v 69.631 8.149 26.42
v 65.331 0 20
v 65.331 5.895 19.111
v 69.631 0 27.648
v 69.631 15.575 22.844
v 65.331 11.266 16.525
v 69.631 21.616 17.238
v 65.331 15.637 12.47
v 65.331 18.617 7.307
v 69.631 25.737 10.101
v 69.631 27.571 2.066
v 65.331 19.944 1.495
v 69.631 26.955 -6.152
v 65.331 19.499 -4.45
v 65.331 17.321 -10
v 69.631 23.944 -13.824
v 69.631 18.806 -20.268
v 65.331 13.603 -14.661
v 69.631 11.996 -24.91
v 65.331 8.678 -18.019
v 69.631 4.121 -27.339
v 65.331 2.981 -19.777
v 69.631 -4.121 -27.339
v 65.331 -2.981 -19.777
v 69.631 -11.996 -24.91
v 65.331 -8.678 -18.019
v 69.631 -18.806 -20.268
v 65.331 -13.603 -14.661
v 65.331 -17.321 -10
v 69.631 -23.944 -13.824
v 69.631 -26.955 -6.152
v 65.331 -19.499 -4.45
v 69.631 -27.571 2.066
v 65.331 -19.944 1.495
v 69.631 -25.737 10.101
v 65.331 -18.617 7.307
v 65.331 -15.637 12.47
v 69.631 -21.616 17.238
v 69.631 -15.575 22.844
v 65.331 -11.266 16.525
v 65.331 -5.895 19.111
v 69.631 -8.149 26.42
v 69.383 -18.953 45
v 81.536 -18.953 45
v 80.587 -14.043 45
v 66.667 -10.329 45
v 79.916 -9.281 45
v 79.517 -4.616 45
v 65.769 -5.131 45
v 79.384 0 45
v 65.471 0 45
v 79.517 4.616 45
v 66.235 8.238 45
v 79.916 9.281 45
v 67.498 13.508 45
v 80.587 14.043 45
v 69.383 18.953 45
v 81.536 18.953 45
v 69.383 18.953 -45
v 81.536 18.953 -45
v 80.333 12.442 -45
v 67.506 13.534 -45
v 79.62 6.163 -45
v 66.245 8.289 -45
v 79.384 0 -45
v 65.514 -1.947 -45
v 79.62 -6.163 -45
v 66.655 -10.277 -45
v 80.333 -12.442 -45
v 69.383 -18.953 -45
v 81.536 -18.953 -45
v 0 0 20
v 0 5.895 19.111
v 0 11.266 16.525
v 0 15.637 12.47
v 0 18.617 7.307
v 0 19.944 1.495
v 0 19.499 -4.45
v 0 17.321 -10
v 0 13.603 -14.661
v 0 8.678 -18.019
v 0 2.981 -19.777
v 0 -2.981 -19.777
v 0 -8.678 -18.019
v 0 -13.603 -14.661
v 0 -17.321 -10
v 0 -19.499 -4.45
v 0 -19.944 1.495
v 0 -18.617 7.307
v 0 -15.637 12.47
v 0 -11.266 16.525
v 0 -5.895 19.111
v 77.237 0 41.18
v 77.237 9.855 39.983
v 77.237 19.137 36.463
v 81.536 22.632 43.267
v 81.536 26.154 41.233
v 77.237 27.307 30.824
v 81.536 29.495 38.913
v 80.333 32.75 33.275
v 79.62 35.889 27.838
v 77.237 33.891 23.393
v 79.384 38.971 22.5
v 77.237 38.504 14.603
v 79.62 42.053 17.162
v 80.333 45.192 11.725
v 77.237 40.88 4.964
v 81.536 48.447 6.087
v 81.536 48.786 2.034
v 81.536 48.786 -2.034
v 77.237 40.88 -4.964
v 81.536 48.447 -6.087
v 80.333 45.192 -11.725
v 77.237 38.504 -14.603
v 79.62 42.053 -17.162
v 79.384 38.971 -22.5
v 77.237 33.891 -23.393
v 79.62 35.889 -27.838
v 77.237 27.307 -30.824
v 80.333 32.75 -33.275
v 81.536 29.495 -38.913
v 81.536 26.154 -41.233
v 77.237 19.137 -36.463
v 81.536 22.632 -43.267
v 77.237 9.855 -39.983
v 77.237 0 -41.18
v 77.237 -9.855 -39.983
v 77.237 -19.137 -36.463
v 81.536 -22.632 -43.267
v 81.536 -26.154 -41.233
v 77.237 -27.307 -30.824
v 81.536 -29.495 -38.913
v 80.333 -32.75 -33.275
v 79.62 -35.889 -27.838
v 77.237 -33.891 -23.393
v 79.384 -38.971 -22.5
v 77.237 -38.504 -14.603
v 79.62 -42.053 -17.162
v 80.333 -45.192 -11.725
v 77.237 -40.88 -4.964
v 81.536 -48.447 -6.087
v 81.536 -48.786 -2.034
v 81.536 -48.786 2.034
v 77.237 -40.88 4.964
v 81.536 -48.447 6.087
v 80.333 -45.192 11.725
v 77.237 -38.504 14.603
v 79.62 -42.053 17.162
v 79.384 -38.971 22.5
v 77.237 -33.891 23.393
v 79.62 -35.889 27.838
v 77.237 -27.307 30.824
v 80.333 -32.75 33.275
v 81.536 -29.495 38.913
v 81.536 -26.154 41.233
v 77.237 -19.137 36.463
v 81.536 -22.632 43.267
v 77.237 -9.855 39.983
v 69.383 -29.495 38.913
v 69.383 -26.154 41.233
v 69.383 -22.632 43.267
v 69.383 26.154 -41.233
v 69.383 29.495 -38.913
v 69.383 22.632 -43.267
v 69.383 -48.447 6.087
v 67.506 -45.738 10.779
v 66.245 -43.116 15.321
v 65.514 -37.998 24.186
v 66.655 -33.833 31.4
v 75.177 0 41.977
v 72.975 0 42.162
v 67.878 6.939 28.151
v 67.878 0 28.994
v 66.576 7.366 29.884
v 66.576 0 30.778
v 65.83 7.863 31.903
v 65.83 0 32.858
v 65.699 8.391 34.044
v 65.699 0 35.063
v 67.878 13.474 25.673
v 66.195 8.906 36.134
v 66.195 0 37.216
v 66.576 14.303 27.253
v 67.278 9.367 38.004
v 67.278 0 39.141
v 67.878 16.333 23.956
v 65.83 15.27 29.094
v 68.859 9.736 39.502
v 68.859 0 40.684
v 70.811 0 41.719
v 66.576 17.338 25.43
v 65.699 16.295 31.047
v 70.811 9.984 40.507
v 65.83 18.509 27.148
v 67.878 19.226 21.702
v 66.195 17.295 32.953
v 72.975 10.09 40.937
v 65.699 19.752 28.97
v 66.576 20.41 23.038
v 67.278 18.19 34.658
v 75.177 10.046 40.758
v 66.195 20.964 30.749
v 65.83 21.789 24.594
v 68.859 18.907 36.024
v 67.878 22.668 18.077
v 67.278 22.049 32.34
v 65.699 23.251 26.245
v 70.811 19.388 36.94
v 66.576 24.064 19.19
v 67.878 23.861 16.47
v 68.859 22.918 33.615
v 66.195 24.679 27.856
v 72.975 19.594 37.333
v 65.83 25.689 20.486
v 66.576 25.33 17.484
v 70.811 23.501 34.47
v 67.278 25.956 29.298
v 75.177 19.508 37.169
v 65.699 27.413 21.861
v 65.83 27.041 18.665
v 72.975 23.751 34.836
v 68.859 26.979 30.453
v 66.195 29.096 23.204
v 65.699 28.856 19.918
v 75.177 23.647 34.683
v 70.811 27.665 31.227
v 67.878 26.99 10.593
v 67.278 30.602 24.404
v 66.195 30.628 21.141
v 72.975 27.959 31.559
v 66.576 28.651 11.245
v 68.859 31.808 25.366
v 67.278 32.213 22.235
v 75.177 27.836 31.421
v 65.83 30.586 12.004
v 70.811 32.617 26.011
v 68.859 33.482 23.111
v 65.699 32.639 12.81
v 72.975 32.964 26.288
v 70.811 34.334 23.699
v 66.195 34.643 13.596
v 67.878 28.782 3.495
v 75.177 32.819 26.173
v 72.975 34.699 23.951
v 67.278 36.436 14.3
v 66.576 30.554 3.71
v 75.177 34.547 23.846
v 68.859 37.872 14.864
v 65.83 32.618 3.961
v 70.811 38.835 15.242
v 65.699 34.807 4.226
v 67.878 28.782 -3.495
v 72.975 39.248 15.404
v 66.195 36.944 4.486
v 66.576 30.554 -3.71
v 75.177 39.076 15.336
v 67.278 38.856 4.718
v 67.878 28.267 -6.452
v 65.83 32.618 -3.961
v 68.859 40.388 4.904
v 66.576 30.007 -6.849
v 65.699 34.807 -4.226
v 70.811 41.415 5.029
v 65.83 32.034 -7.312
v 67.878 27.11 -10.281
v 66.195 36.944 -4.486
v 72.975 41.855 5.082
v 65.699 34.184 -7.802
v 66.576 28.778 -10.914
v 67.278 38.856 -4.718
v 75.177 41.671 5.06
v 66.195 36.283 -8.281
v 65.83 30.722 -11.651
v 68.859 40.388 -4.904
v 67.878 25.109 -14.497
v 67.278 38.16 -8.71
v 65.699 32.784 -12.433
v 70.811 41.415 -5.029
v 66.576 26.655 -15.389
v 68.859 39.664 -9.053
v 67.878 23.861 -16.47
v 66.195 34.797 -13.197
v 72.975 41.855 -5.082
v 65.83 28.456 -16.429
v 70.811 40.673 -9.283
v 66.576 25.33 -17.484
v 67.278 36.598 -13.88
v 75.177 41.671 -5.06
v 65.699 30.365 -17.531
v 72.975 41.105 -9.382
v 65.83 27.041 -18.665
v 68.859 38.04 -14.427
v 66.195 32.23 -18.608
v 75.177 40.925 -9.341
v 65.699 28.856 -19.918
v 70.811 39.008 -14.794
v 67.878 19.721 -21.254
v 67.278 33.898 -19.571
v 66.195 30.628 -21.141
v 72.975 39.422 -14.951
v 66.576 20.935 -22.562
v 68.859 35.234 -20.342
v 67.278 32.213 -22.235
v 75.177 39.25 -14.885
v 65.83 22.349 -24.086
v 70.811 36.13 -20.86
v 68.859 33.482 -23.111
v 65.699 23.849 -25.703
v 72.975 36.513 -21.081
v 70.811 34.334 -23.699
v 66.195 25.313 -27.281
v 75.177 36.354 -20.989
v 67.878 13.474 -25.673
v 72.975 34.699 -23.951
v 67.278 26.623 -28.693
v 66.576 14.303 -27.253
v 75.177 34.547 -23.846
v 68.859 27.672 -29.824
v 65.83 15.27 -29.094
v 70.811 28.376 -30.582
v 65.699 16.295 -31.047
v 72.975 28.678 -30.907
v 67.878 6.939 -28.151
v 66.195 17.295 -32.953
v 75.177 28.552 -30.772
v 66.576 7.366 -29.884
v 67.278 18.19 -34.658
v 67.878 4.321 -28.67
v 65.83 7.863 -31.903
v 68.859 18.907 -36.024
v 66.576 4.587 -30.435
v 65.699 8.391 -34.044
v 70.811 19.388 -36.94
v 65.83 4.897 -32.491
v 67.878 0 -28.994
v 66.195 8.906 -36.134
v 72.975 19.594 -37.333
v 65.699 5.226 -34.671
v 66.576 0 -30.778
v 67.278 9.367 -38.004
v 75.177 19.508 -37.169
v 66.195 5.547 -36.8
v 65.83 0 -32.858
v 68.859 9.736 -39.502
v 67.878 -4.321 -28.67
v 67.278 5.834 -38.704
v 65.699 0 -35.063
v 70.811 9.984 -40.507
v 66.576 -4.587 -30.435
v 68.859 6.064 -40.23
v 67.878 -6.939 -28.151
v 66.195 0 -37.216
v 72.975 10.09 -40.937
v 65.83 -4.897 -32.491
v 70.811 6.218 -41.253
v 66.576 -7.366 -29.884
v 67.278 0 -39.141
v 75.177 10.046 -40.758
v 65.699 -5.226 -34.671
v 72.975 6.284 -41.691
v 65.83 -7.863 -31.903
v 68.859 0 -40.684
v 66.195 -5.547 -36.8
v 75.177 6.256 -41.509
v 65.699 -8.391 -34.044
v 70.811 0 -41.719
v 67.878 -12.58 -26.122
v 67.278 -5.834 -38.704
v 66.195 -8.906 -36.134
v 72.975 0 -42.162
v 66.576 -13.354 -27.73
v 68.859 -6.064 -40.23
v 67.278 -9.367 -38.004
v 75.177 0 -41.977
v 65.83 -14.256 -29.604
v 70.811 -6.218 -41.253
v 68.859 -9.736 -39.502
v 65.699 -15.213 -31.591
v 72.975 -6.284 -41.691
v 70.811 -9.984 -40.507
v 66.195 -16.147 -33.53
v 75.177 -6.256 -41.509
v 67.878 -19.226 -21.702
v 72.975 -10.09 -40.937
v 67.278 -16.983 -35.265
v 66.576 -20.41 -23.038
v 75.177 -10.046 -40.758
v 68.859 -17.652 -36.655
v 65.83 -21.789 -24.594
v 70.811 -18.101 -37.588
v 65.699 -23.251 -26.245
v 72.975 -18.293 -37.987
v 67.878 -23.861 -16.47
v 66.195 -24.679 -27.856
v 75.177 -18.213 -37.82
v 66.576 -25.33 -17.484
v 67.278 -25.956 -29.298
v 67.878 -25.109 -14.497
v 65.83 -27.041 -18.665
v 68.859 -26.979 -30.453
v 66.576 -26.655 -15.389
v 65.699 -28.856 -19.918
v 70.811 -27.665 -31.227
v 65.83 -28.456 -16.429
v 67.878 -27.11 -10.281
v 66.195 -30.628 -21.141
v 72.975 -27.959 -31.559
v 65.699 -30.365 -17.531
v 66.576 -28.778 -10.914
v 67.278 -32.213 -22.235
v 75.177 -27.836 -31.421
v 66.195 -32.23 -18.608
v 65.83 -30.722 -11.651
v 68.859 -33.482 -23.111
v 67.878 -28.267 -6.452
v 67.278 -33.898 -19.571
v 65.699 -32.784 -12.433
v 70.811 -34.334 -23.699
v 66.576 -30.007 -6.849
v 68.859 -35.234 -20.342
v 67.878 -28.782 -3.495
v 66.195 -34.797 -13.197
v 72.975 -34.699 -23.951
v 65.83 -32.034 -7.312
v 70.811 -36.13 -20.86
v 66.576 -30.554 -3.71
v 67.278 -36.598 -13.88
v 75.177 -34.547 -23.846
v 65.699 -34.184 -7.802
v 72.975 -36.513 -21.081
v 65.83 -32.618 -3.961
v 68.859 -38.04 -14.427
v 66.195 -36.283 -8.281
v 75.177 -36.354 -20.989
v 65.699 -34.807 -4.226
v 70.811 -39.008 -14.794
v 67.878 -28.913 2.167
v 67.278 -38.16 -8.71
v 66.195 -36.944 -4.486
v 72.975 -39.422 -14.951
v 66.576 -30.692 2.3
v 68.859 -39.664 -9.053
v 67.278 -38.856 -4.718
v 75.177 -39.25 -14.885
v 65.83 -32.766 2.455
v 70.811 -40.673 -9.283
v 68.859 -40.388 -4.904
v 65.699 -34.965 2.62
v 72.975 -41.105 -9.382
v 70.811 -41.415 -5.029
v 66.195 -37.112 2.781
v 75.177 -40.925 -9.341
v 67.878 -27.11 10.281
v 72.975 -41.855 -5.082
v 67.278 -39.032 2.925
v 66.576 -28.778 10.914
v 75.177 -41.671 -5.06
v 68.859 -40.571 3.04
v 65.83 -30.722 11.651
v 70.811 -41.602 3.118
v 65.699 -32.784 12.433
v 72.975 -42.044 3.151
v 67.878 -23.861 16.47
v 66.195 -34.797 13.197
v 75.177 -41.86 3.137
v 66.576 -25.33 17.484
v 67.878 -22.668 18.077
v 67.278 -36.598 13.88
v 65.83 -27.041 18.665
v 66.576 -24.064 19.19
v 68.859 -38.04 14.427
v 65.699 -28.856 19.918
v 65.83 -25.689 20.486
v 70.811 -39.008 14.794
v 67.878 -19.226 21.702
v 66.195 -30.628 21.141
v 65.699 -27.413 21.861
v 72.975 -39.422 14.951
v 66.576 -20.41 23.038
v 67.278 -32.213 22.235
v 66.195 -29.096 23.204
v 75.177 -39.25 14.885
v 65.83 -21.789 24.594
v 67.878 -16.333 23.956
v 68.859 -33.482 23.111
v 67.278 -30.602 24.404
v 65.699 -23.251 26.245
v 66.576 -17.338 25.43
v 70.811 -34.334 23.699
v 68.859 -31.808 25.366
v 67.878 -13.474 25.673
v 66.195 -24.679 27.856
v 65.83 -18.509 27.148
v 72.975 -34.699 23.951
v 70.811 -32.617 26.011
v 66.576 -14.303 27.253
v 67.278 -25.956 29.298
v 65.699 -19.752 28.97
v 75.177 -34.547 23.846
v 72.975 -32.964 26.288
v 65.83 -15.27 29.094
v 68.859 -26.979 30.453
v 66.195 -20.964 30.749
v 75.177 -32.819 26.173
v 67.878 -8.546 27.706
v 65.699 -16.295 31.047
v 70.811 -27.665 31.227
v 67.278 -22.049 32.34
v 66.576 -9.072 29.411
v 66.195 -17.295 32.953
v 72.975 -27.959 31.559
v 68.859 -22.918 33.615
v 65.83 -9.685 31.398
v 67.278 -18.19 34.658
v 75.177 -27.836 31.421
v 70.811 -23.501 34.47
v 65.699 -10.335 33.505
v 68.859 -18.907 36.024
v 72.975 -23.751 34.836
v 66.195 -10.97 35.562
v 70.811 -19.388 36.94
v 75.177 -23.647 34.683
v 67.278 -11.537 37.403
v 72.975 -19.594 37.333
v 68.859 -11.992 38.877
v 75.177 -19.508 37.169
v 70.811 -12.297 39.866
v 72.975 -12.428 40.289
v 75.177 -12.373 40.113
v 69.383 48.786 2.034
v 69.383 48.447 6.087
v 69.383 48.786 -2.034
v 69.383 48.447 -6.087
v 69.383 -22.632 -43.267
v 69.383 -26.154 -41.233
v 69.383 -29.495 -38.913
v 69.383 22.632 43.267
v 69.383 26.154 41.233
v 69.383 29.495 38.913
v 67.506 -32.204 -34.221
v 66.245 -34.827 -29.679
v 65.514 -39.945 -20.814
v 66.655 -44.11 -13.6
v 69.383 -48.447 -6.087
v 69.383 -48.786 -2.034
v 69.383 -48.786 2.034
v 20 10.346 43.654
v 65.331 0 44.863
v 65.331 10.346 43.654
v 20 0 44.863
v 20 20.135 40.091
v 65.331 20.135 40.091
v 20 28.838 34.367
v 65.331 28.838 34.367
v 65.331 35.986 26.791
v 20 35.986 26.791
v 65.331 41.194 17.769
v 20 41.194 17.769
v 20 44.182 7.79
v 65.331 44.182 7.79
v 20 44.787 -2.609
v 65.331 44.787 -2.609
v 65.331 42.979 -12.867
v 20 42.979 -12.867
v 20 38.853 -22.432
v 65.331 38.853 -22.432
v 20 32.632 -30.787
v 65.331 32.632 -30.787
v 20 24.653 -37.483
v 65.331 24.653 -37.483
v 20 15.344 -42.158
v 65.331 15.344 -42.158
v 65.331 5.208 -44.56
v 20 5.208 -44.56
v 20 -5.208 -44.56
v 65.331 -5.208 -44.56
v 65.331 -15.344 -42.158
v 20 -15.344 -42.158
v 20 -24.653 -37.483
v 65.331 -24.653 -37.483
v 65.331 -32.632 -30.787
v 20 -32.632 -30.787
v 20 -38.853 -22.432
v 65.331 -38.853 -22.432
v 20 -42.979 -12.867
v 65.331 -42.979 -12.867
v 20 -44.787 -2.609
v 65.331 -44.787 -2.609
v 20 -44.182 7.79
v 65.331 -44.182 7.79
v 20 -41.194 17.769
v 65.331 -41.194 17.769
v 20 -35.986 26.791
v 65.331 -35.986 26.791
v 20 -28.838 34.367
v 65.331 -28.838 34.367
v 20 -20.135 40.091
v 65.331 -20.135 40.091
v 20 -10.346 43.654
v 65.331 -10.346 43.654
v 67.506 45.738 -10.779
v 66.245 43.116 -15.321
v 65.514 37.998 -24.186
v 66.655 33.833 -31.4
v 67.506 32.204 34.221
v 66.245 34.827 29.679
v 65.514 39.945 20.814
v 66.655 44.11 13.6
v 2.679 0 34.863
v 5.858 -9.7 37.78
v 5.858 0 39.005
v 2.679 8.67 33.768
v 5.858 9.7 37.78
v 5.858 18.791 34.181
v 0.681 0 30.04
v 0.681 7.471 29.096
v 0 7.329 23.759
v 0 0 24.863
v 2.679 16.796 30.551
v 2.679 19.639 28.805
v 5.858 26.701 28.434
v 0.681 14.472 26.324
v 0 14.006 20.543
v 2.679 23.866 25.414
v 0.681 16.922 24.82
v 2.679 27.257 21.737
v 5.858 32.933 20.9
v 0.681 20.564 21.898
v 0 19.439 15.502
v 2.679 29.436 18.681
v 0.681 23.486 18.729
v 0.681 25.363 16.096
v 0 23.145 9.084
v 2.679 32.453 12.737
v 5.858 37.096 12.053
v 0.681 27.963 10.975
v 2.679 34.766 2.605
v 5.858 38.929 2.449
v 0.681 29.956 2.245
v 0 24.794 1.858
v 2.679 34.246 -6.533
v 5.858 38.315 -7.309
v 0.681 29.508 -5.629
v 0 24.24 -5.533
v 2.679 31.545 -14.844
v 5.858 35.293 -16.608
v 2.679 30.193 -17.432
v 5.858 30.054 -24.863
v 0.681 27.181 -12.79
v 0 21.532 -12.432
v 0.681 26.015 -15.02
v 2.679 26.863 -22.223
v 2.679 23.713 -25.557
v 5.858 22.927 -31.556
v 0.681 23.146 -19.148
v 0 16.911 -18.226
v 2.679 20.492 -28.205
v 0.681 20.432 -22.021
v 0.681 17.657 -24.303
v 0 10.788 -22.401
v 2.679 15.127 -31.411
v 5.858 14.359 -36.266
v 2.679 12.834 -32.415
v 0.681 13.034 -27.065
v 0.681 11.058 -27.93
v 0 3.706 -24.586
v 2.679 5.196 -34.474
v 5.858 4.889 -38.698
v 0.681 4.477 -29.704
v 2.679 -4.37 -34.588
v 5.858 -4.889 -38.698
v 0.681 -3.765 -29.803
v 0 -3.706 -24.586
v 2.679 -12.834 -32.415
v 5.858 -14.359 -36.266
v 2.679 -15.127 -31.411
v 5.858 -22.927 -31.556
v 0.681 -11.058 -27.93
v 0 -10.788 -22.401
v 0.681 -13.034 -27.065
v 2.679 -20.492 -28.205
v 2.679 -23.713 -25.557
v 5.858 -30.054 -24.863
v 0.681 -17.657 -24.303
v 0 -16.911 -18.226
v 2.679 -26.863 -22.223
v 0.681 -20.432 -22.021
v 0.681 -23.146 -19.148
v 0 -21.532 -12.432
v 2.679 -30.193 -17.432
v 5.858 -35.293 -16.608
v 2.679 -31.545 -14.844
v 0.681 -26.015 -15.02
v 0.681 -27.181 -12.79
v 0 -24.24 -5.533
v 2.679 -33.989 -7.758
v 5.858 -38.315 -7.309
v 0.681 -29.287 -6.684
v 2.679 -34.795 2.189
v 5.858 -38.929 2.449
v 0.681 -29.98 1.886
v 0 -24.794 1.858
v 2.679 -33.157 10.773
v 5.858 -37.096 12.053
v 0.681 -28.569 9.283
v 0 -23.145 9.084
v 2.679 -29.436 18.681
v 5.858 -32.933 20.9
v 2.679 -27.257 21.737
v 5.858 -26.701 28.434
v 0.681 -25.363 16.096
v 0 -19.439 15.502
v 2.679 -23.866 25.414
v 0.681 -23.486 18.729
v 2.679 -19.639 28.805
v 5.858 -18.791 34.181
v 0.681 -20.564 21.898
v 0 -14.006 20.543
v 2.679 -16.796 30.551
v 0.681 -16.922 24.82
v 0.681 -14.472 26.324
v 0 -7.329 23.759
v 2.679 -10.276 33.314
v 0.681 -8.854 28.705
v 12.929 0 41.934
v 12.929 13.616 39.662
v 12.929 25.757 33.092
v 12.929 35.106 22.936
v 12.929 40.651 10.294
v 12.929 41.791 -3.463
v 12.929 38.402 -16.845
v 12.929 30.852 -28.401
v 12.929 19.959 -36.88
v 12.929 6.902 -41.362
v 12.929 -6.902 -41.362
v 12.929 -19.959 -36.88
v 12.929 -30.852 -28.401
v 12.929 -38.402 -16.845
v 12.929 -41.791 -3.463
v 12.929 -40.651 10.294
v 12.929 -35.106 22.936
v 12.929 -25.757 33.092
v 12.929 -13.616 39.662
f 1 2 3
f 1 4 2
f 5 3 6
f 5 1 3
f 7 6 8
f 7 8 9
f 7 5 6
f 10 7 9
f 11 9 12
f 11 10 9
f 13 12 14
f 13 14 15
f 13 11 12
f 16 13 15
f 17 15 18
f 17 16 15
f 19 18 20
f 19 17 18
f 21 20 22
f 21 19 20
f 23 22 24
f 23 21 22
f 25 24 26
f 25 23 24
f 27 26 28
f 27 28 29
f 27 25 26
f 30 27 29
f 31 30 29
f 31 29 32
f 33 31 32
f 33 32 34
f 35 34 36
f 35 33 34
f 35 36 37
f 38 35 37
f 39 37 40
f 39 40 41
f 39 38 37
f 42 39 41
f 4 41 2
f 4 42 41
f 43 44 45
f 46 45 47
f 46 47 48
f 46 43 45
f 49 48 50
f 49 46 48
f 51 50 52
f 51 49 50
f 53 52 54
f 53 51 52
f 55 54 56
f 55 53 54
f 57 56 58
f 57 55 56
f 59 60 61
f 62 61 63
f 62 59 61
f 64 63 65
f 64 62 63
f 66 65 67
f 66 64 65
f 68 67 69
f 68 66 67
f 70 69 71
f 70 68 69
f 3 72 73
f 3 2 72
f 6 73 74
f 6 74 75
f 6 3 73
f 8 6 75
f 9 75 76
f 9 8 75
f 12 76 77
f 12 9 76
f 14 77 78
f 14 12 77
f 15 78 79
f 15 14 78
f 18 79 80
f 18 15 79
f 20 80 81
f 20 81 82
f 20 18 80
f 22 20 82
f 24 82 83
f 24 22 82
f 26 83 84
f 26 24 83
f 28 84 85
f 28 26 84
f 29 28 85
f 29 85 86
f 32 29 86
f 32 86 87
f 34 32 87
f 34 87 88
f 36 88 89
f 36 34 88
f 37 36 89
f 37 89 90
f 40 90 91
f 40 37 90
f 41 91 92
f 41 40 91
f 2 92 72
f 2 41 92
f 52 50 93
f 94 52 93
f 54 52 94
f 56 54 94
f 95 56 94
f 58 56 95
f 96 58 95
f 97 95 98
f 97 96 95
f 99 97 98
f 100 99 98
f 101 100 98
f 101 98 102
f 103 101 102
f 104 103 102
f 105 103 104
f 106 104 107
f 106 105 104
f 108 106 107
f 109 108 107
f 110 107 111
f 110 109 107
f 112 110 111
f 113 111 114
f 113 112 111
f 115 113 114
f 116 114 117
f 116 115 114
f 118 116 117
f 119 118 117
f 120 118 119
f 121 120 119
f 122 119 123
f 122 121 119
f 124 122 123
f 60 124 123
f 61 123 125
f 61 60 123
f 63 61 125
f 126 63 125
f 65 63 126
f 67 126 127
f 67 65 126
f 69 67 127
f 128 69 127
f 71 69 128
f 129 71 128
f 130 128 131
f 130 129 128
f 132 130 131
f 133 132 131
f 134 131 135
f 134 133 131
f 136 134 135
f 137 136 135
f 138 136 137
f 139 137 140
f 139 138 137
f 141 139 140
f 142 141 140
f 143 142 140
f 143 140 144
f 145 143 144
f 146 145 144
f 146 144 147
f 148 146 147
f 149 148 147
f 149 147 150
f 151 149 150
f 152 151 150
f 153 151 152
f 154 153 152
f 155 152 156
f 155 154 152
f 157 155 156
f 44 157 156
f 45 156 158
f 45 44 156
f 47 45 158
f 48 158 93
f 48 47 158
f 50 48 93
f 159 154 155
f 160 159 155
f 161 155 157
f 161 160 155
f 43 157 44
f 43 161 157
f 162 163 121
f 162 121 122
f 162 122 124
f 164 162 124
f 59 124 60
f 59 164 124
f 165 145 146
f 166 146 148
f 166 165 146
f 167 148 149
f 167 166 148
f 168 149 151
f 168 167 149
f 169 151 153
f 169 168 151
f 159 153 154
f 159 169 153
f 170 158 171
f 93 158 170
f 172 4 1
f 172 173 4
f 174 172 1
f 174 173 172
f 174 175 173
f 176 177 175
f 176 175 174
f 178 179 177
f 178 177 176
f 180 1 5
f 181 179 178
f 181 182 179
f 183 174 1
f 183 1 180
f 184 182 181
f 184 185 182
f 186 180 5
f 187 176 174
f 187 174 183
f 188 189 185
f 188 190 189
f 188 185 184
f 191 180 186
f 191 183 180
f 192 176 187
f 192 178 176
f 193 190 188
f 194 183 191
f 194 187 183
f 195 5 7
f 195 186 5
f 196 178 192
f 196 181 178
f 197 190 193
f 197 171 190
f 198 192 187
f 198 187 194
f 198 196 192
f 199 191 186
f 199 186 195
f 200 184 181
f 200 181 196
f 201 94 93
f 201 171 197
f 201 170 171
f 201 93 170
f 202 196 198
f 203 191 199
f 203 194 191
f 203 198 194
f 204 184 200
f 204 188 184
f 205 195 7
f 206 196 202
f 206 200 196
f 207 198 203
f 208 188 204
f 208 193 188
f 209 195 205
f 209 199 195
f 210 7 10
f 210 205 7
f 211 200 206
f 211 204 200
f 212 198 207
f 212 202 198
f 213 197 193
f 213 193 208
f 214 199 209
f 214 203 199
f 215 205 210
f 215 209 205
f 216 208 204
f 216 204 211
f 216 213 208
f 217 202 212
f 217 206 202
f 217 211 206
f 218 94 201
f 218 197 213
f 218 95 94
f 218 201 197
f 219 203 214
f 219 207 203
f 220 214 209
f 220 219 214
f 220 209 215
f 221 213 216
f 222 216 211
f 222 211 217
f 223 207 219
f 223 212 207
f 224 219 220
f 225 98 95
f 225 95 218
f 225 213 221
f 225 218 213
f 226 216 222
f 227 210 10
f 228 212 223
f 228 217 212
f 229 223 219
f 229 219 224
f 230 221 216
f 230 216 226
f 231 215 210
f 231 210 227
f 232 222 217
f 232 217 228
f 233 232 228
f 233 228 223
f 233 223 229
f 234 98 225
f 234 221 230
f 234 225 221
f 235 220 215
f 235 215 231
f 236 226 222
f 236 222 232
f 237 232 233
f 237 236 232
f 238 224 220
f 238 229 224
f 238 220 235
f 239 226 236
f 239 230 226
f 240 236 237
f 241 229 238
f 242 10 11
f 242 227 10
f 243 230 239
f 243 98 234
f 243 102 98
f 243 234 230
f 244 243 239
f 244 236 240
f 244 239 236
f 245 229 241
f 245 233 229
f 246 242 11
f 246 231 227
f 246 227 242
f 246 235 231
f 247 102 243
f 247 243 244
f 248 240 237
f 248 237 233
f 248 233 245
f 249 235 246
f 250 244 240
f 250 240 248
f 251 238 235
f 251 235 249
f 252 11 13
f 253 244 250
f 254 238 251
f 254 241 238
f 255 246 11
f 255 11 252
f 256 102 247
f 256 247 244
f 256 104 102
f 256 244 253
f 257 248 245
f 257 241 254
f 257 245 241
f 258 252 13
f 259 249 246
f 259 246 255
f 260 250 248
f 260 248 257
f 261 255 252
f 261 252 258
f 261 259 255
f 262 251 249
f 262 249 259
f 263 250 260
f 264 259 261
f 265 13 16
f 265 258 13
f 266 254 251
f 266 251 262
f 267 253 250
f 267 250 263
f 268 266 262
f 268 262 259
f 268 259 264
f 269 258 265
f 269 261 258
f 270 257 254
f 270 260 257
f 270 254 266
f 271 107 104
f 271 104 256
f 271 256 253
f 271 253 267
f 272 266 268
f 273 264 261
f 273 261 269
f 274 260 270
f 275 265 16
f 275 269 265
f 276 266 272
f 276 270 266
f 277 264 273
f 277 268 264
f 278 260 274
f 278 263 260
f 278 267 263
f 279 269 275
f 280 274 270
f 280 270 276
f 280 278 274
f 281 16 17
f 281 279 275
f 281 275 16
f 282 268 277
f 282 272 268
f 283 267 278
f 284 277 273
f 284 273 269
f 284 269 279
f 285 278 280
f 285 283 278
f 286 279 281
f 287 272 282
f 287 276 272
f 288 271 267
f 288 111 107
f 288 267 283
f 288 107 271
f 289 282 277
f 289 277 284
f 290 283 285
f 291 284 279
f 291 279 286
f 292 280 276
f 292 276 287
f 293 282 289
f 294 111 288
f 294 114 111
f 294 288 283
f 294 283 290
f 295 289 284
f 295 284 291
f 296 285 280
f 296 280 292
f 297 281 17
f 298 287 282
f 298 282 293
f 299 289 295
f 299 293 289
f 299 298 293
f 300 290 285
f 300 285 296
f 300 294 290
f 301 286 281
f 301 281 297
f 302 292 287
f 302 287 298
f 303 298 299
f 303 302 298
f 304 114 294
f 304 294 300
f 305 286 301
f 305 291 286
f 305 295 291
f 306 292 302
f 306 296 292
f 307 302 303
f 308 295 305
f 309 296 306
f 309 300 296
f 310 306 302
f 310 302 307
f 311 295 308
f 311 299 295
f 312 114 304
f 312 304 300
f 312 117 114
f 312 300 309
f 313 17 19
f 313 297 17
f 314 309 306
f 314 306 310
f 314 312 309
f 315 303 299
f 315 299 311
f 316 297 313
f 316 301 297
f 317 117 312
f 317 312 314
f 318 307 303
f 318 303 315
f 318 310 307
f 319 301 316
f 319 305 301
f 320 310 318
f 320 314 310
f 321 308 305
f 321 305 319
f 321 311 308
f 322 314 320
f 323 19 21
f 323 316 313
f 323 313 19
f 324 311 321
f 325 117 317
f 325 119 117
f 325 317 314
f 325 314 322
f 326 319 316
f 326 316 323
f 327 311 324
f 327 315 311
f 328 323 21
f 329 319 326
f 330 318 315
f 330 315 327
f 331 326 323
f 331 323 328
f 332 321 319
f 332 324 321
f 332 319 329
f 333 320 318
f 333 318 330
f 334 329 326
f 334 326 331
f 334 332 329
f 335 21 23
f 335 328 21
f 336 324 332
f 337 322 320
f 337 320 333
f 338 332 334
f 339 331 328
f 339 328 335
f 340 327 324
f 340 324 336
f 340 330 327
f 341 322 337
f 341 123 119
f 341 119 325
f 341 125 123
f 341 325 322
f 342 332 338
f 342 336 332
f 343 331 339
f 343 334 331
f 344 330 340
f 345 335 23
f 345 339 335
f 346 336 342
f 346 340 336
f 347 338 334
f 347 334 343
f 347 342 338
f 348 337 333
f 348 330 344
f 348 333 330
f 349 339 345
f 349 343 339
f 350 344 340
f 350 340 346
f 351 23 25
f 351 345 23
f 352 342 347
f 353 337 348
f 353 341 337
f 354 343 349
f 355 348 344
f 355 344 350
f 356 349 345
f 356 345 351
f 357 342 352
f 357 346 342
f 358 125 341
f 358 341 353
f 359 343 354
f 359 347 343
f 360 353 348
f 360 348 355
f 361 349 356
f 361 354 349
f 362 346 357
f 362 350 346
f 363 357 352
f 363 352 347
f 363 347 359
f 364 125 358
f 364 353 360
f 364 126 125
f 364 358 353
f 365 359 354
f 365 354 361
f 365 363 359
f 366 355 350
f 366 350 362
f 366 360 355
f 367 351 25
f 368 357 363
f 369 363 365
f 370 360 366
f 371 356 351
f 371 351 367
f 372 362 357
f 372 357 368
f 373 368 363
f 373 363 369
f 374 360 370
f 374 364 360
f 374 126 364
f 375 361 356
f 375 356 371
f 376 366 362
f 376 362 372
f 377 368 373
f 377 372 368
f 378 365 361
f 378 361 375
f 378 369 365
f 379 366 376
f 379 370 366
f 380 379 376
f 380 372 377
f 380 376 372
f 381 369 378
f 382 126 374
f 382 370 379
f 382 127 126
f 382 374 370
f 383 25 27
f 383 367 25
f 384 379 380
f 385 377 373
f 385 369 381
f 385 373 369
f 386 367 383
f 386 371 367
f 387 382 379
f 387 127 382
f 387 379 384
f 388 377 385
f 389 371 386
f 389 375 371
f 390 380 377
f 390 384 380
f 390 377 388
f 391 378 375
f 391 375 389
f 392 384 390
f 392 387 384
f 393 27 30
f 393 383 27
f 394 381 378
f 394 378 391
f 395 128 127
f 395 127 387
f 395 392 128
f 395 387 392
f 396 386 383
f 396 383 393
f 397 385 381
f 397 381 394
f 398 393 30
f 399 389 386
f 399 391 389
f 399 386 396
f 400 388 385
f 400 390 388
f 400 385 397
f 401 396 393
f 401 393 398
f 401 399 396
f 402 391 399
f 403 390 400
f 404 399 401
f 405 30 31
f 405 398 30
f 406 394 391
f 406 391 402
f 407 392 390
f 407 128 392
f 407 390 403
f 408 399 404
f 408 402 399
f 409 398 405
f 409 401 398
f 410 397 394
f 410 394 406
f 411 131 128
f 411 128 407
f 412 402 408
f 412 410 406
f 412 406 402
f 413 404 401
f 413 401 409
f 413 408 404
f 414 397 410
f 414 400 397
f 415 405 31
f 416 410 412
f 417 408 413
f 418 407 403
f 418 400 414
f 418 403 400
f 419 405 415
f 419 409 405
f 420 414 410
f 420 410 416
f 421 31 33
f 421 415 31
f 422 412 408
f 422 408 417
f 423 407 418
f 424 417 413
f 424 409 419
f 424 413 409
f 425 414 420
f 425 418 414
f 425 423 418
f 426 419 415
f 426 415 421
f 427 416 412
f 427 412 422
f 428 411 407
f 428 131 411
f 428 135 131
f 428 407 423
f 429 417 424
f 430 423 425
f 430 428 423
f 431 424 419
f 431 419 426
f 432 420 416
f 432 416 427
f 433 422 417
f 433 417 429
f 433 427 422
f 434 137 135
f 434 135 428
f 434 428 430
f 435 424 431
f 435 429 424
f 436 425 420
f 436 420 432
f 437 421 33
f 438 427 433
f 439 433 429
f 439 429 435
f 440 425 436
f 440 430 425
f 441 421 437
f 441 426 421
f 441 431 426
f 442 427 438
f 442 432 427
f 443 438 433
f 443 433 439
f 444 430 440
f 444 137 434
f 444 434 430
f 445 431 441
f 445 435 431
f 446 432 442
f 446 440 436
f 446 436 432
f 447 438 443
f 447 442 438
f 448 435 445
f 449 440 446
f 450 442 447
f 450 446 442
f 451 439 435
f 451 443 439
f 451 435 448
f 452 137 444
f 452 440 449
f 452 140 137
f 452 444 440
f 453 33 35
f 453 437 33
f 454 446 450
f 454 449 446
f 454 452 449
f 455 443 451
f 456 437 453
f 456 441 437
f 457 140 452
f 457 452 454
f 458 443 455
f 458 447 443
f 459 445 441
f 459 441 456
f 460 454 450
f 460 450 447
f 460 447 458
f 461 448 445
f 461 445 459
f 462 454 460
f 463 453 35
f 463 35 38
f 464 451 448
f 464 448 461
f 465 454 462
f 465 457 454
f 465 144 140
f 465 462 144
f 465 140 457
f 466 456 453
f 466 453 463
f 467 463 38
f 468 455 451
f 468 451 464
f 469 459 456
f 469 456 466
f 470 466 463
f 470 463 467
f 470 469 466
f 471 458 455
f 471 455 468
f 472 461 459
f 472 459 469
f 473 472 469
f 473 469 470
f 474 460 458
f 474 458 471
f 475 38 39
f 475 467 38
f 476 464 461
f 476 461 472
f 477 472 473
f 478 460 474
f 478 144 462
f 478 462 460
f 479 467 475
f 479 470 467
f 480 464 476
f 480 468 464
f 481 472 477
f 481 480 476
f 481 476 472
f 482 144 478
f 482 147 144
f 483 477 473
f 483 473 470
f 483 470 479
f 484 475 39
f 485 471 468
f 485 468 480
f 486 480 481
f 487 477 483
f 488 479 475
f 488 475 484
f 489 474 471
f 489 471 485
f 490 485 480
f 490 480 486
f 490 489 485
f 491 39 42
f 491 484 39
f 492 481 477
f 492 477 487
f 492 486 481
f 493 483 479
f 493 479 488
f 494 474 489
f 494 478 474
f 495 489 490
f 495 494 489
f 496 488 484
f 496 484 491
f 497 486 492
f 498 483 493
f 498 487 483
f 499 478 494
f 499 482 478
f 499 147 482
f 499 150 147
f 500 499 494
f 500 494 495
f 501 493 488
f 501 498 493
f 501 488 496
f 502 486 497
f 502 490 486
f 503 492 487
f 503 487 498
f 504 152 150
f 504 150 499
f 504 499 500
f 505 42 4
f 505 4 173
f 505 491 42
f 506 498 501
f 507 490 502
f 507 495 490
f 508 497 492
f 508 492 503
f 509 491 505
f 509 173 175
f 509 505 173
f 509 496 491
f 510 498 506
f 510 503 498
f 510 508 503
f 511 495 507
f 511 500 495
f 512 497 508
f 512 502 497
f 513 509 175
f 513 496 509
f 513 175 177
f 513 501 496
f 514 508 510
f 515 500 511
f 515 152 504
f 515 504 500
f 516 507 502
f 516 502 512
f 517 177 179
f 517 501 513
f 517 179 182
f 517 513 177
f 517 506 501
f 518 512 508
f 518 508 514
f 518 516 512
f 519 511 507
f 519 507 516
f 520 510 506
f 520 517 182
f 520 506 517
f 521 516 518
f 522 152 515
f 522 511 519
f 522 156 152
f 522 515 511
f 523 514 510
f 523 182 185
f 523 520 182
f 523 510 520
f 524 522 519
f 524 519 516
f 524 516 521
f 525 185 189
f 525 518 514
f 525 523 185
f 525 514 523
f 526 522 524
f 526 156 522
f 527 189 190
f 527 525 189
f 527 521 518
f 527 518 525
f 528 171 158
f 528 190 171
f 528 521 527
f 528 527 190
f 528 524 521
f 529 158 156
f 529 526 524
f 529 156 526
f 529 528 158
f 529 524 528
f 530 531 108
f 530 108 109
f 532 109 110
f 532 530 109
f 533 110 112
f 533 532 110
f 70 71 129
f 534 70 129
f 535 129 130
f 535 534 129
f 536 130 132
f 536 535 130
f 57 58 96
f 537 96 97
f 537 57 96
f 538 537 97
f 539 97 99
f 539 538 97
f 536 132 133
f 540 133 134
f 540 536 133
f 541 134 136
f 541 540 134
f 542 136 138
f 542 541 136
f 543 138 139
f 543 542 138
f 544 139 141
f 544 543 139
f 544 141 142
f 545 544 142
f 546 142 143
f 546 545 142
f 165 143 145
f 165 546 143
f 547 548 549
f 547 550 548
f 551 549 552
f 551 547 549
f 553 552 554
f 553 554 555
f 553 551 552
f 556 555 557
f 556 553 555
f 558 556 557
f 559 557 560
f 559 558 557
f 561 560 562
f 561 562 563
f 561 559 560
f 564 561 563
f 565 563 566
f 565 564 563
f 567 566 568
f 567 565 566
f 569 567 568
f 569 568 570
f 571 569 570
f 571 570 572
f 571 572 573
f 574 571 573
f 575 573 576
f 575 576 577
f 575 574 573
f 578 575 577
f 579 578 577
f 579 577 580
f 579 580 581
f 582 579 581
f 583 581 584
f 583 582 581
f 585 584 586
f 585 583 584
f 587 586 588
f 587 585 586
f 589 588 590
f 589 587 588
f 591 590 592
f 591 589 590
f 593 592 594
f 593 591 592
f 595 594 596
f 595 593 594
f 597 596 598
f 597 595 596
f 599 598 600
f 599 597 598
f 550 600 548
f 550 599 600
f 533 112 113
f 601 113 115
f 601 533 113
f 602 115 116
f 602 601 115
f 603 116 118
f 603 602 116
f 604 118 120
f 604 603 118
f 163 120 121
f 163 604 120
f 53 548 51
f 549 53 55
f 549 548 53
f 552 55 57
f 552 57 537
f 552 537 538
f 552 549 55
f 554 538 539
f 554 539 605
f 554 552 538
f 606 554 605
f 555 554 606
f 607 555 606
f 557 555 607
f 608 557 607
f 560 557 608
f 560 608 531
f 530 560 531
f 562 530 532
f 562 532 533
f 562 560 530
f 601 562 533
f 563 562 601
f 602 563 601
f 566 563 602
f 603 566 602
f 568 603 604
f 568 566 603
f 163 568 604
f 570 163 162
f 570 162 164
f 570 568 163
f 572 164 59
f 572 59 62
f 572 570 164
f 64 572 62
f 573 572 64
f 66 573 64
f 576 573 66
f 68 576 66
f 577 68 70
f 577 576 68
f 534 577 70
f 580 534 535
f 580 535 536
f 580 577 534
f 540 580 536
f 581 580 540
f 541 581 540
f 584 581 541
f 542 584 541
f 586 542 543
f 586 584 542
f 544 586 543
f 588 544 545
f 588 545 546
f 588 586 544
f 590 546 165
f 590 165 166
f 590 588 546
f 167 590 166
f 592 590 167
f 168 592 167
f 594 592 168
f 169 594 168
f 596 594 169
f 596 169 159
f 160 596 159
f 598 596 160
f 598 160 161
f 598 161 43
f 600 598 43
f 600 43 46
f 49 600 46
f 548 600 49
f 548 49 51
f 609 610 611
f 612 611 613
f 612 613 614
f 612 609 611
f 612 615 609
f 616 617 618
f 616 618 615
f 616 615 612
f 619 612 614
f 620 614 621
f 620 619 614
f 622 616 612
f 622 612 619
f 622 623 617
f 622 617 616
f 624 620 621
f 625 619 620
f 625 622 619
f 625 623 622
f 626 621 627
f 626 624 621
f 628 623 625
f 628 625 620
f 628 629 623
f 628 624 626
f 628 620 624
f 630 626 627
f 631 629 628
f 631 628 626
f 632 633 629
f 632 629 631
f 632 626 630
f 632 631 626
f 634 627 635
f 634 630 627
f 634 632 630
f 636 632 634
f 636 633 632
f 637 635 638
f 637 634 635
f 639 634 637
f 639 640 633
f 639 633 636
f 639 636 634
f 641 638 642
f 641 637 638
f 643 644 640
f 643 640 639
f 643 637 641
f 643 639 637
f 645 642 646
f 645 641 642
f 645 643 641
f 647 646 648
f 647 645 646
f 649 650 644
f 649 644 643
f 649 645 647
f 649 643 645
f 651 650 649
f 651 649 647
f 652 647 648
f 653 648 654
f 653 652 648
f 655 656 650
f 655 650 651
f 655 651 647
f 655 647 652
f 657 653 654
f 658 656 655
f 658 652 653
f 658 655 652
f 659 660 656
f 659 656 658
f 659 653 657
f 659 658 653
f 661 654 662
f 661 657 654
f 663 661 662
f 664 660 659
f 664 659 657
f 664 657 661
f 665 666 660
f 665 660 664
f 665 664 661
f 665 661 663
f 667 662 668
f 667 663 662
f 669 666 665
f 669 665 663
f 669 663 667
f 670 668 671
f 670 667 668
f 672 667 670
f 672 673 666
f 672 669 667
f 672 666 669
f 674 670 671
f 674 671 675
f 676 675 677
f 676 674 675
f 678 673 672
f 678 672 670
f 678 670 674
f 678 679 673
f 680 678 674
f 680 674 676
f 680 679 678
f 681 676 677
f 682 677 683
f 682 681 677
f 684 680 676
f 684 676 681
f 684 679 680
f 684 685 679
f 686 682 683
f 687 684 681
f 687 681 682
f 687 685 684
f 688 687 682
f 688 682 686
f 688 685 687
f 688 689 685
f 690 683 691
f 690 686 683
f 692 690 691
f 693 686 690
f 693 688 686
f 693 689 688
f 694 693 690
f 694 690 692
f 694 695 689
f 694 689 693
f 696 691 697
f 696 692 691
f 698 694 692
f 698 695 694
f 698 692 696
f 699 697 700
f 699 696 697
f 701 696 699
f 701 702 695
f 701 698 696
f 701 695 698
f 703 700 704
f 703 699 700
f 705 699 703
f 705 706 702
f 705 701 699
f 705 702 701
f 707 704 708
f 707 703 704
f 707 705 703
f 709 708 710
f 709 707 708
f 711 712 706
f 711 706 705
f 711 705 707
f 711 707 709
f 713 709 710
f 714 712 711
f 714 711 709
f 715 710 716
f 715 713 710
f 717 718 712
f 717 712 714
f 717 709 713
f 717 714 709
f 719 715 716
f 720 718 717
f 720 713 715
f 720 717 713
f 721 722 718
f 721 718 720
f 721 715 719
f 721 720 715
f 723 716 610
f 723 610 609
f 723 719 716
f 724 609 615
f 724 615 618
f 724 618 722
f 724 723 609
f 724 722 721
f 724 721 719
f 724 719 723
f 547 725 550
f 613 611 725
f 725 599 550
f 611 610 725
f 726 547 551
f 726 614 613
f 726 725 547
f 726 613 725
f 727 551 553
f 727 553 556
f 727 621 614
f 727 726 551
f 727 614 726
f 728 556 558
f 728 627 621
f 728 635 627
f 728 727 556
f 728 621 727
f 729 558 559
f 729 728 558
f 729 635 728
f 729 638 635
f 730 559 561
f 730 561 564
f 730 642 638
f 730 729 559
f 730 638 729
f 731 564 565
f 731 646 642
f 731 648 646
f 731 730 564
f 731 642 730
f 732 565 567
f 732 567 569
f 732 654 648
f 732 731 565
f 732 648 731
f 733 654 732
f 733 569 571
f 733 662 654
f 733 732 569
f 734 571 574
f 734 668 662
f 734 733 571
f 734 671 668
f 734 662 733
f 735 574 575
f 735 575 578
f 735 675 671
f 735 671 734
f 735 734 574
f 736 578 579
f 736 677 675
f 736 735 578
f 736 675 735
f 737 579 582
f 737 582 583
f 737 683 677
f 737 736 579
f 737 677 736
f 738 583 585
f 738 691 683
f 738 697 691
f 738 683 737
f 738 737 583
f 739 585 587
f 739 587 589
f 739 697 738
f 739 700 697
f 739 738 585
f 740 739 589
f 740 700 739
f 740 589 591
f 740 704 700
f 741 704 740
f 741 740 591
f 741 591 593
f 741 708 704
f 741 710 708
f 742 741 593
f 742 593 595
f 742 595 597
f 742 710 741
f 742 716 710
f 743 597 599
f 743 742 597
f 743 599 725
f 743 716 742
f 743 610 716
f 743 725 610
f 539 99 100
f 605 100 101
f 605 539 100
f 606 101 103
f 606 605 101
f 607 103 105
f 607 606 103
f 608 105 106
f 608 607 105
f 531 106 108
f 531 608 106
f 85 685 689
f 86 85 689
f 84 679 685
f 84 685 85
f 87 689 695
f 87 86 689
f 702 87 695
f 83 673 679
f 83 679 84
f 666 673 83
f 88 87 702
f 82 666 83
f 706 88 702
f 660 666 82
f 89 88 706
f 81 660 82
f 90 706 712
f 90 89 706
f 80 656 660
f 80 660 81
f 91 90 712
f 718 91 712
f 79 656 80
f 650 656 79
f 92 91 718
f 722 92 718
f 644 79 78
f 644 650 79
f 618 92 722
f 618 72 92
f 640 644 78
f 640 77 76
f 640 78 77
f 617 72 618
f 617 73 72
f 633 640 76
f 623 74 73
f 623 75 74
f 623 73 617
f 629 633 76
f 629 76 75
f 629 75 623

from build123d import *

# Parameters (mm, degrees)
F2_R     = 117.132318
F3_DEPTH = 157.902554


with BuildPart() as f1:
    # F0 (on Front) → F1 (revolve)
    with BuildSketch(Plane.XZ):
        with BuildLine():
            Line((0, 20), (20, 20))
            Line((20, 20), (65.331466, 20))
            Line((65.331466, 20), (65.331466, 44.863343))
            Line((65.331466, 44.863343), (20, 44.863343))
            Line((20, 44.863343), (5.857864, 39.005479))
            ThreePointArc((5.857864, 39.005479), (1.522409, 32.517012), (0, 24.863343))
            Line((0, 24.863343), (0, 20))
        make_face()
        with BuildLine():
            Line((65.331466, 44.863343), (65.331466, 20))
            Line((65.331466, 20), (69.630553, 27.648209))
            ThreePointArc((69.630553, 27.648209), (66.667779, 38.217287), (77.236857, 41.180061))
            Line((77.236857, 41.180061), (81.535943, 48.82827))
            Line((81.535943, 48.82827), (69.382586, 48.82827))
            Line((69.382586, 48.82827), (65.331466, 44.863343))
        make_face()
    revolve(axis=Axis((10, 0, 0), (-1, 0, 0)))

    # F2 (on Right) → F3 (cut)
    with BuildSketch(Plane.YZ):
        Circle(F2_R)
        Polygon((-51.961524, 0), (-25.980762, 45), (25.980762, 45), (51.961524, 0), (25.980762, -45), (-25.980762, -45), align=None, mode=Mode.SUBTRACT)
    extrude(amount=F3_DEPTH, mode=Mode.SUBTRACT)


solid = f1.part
